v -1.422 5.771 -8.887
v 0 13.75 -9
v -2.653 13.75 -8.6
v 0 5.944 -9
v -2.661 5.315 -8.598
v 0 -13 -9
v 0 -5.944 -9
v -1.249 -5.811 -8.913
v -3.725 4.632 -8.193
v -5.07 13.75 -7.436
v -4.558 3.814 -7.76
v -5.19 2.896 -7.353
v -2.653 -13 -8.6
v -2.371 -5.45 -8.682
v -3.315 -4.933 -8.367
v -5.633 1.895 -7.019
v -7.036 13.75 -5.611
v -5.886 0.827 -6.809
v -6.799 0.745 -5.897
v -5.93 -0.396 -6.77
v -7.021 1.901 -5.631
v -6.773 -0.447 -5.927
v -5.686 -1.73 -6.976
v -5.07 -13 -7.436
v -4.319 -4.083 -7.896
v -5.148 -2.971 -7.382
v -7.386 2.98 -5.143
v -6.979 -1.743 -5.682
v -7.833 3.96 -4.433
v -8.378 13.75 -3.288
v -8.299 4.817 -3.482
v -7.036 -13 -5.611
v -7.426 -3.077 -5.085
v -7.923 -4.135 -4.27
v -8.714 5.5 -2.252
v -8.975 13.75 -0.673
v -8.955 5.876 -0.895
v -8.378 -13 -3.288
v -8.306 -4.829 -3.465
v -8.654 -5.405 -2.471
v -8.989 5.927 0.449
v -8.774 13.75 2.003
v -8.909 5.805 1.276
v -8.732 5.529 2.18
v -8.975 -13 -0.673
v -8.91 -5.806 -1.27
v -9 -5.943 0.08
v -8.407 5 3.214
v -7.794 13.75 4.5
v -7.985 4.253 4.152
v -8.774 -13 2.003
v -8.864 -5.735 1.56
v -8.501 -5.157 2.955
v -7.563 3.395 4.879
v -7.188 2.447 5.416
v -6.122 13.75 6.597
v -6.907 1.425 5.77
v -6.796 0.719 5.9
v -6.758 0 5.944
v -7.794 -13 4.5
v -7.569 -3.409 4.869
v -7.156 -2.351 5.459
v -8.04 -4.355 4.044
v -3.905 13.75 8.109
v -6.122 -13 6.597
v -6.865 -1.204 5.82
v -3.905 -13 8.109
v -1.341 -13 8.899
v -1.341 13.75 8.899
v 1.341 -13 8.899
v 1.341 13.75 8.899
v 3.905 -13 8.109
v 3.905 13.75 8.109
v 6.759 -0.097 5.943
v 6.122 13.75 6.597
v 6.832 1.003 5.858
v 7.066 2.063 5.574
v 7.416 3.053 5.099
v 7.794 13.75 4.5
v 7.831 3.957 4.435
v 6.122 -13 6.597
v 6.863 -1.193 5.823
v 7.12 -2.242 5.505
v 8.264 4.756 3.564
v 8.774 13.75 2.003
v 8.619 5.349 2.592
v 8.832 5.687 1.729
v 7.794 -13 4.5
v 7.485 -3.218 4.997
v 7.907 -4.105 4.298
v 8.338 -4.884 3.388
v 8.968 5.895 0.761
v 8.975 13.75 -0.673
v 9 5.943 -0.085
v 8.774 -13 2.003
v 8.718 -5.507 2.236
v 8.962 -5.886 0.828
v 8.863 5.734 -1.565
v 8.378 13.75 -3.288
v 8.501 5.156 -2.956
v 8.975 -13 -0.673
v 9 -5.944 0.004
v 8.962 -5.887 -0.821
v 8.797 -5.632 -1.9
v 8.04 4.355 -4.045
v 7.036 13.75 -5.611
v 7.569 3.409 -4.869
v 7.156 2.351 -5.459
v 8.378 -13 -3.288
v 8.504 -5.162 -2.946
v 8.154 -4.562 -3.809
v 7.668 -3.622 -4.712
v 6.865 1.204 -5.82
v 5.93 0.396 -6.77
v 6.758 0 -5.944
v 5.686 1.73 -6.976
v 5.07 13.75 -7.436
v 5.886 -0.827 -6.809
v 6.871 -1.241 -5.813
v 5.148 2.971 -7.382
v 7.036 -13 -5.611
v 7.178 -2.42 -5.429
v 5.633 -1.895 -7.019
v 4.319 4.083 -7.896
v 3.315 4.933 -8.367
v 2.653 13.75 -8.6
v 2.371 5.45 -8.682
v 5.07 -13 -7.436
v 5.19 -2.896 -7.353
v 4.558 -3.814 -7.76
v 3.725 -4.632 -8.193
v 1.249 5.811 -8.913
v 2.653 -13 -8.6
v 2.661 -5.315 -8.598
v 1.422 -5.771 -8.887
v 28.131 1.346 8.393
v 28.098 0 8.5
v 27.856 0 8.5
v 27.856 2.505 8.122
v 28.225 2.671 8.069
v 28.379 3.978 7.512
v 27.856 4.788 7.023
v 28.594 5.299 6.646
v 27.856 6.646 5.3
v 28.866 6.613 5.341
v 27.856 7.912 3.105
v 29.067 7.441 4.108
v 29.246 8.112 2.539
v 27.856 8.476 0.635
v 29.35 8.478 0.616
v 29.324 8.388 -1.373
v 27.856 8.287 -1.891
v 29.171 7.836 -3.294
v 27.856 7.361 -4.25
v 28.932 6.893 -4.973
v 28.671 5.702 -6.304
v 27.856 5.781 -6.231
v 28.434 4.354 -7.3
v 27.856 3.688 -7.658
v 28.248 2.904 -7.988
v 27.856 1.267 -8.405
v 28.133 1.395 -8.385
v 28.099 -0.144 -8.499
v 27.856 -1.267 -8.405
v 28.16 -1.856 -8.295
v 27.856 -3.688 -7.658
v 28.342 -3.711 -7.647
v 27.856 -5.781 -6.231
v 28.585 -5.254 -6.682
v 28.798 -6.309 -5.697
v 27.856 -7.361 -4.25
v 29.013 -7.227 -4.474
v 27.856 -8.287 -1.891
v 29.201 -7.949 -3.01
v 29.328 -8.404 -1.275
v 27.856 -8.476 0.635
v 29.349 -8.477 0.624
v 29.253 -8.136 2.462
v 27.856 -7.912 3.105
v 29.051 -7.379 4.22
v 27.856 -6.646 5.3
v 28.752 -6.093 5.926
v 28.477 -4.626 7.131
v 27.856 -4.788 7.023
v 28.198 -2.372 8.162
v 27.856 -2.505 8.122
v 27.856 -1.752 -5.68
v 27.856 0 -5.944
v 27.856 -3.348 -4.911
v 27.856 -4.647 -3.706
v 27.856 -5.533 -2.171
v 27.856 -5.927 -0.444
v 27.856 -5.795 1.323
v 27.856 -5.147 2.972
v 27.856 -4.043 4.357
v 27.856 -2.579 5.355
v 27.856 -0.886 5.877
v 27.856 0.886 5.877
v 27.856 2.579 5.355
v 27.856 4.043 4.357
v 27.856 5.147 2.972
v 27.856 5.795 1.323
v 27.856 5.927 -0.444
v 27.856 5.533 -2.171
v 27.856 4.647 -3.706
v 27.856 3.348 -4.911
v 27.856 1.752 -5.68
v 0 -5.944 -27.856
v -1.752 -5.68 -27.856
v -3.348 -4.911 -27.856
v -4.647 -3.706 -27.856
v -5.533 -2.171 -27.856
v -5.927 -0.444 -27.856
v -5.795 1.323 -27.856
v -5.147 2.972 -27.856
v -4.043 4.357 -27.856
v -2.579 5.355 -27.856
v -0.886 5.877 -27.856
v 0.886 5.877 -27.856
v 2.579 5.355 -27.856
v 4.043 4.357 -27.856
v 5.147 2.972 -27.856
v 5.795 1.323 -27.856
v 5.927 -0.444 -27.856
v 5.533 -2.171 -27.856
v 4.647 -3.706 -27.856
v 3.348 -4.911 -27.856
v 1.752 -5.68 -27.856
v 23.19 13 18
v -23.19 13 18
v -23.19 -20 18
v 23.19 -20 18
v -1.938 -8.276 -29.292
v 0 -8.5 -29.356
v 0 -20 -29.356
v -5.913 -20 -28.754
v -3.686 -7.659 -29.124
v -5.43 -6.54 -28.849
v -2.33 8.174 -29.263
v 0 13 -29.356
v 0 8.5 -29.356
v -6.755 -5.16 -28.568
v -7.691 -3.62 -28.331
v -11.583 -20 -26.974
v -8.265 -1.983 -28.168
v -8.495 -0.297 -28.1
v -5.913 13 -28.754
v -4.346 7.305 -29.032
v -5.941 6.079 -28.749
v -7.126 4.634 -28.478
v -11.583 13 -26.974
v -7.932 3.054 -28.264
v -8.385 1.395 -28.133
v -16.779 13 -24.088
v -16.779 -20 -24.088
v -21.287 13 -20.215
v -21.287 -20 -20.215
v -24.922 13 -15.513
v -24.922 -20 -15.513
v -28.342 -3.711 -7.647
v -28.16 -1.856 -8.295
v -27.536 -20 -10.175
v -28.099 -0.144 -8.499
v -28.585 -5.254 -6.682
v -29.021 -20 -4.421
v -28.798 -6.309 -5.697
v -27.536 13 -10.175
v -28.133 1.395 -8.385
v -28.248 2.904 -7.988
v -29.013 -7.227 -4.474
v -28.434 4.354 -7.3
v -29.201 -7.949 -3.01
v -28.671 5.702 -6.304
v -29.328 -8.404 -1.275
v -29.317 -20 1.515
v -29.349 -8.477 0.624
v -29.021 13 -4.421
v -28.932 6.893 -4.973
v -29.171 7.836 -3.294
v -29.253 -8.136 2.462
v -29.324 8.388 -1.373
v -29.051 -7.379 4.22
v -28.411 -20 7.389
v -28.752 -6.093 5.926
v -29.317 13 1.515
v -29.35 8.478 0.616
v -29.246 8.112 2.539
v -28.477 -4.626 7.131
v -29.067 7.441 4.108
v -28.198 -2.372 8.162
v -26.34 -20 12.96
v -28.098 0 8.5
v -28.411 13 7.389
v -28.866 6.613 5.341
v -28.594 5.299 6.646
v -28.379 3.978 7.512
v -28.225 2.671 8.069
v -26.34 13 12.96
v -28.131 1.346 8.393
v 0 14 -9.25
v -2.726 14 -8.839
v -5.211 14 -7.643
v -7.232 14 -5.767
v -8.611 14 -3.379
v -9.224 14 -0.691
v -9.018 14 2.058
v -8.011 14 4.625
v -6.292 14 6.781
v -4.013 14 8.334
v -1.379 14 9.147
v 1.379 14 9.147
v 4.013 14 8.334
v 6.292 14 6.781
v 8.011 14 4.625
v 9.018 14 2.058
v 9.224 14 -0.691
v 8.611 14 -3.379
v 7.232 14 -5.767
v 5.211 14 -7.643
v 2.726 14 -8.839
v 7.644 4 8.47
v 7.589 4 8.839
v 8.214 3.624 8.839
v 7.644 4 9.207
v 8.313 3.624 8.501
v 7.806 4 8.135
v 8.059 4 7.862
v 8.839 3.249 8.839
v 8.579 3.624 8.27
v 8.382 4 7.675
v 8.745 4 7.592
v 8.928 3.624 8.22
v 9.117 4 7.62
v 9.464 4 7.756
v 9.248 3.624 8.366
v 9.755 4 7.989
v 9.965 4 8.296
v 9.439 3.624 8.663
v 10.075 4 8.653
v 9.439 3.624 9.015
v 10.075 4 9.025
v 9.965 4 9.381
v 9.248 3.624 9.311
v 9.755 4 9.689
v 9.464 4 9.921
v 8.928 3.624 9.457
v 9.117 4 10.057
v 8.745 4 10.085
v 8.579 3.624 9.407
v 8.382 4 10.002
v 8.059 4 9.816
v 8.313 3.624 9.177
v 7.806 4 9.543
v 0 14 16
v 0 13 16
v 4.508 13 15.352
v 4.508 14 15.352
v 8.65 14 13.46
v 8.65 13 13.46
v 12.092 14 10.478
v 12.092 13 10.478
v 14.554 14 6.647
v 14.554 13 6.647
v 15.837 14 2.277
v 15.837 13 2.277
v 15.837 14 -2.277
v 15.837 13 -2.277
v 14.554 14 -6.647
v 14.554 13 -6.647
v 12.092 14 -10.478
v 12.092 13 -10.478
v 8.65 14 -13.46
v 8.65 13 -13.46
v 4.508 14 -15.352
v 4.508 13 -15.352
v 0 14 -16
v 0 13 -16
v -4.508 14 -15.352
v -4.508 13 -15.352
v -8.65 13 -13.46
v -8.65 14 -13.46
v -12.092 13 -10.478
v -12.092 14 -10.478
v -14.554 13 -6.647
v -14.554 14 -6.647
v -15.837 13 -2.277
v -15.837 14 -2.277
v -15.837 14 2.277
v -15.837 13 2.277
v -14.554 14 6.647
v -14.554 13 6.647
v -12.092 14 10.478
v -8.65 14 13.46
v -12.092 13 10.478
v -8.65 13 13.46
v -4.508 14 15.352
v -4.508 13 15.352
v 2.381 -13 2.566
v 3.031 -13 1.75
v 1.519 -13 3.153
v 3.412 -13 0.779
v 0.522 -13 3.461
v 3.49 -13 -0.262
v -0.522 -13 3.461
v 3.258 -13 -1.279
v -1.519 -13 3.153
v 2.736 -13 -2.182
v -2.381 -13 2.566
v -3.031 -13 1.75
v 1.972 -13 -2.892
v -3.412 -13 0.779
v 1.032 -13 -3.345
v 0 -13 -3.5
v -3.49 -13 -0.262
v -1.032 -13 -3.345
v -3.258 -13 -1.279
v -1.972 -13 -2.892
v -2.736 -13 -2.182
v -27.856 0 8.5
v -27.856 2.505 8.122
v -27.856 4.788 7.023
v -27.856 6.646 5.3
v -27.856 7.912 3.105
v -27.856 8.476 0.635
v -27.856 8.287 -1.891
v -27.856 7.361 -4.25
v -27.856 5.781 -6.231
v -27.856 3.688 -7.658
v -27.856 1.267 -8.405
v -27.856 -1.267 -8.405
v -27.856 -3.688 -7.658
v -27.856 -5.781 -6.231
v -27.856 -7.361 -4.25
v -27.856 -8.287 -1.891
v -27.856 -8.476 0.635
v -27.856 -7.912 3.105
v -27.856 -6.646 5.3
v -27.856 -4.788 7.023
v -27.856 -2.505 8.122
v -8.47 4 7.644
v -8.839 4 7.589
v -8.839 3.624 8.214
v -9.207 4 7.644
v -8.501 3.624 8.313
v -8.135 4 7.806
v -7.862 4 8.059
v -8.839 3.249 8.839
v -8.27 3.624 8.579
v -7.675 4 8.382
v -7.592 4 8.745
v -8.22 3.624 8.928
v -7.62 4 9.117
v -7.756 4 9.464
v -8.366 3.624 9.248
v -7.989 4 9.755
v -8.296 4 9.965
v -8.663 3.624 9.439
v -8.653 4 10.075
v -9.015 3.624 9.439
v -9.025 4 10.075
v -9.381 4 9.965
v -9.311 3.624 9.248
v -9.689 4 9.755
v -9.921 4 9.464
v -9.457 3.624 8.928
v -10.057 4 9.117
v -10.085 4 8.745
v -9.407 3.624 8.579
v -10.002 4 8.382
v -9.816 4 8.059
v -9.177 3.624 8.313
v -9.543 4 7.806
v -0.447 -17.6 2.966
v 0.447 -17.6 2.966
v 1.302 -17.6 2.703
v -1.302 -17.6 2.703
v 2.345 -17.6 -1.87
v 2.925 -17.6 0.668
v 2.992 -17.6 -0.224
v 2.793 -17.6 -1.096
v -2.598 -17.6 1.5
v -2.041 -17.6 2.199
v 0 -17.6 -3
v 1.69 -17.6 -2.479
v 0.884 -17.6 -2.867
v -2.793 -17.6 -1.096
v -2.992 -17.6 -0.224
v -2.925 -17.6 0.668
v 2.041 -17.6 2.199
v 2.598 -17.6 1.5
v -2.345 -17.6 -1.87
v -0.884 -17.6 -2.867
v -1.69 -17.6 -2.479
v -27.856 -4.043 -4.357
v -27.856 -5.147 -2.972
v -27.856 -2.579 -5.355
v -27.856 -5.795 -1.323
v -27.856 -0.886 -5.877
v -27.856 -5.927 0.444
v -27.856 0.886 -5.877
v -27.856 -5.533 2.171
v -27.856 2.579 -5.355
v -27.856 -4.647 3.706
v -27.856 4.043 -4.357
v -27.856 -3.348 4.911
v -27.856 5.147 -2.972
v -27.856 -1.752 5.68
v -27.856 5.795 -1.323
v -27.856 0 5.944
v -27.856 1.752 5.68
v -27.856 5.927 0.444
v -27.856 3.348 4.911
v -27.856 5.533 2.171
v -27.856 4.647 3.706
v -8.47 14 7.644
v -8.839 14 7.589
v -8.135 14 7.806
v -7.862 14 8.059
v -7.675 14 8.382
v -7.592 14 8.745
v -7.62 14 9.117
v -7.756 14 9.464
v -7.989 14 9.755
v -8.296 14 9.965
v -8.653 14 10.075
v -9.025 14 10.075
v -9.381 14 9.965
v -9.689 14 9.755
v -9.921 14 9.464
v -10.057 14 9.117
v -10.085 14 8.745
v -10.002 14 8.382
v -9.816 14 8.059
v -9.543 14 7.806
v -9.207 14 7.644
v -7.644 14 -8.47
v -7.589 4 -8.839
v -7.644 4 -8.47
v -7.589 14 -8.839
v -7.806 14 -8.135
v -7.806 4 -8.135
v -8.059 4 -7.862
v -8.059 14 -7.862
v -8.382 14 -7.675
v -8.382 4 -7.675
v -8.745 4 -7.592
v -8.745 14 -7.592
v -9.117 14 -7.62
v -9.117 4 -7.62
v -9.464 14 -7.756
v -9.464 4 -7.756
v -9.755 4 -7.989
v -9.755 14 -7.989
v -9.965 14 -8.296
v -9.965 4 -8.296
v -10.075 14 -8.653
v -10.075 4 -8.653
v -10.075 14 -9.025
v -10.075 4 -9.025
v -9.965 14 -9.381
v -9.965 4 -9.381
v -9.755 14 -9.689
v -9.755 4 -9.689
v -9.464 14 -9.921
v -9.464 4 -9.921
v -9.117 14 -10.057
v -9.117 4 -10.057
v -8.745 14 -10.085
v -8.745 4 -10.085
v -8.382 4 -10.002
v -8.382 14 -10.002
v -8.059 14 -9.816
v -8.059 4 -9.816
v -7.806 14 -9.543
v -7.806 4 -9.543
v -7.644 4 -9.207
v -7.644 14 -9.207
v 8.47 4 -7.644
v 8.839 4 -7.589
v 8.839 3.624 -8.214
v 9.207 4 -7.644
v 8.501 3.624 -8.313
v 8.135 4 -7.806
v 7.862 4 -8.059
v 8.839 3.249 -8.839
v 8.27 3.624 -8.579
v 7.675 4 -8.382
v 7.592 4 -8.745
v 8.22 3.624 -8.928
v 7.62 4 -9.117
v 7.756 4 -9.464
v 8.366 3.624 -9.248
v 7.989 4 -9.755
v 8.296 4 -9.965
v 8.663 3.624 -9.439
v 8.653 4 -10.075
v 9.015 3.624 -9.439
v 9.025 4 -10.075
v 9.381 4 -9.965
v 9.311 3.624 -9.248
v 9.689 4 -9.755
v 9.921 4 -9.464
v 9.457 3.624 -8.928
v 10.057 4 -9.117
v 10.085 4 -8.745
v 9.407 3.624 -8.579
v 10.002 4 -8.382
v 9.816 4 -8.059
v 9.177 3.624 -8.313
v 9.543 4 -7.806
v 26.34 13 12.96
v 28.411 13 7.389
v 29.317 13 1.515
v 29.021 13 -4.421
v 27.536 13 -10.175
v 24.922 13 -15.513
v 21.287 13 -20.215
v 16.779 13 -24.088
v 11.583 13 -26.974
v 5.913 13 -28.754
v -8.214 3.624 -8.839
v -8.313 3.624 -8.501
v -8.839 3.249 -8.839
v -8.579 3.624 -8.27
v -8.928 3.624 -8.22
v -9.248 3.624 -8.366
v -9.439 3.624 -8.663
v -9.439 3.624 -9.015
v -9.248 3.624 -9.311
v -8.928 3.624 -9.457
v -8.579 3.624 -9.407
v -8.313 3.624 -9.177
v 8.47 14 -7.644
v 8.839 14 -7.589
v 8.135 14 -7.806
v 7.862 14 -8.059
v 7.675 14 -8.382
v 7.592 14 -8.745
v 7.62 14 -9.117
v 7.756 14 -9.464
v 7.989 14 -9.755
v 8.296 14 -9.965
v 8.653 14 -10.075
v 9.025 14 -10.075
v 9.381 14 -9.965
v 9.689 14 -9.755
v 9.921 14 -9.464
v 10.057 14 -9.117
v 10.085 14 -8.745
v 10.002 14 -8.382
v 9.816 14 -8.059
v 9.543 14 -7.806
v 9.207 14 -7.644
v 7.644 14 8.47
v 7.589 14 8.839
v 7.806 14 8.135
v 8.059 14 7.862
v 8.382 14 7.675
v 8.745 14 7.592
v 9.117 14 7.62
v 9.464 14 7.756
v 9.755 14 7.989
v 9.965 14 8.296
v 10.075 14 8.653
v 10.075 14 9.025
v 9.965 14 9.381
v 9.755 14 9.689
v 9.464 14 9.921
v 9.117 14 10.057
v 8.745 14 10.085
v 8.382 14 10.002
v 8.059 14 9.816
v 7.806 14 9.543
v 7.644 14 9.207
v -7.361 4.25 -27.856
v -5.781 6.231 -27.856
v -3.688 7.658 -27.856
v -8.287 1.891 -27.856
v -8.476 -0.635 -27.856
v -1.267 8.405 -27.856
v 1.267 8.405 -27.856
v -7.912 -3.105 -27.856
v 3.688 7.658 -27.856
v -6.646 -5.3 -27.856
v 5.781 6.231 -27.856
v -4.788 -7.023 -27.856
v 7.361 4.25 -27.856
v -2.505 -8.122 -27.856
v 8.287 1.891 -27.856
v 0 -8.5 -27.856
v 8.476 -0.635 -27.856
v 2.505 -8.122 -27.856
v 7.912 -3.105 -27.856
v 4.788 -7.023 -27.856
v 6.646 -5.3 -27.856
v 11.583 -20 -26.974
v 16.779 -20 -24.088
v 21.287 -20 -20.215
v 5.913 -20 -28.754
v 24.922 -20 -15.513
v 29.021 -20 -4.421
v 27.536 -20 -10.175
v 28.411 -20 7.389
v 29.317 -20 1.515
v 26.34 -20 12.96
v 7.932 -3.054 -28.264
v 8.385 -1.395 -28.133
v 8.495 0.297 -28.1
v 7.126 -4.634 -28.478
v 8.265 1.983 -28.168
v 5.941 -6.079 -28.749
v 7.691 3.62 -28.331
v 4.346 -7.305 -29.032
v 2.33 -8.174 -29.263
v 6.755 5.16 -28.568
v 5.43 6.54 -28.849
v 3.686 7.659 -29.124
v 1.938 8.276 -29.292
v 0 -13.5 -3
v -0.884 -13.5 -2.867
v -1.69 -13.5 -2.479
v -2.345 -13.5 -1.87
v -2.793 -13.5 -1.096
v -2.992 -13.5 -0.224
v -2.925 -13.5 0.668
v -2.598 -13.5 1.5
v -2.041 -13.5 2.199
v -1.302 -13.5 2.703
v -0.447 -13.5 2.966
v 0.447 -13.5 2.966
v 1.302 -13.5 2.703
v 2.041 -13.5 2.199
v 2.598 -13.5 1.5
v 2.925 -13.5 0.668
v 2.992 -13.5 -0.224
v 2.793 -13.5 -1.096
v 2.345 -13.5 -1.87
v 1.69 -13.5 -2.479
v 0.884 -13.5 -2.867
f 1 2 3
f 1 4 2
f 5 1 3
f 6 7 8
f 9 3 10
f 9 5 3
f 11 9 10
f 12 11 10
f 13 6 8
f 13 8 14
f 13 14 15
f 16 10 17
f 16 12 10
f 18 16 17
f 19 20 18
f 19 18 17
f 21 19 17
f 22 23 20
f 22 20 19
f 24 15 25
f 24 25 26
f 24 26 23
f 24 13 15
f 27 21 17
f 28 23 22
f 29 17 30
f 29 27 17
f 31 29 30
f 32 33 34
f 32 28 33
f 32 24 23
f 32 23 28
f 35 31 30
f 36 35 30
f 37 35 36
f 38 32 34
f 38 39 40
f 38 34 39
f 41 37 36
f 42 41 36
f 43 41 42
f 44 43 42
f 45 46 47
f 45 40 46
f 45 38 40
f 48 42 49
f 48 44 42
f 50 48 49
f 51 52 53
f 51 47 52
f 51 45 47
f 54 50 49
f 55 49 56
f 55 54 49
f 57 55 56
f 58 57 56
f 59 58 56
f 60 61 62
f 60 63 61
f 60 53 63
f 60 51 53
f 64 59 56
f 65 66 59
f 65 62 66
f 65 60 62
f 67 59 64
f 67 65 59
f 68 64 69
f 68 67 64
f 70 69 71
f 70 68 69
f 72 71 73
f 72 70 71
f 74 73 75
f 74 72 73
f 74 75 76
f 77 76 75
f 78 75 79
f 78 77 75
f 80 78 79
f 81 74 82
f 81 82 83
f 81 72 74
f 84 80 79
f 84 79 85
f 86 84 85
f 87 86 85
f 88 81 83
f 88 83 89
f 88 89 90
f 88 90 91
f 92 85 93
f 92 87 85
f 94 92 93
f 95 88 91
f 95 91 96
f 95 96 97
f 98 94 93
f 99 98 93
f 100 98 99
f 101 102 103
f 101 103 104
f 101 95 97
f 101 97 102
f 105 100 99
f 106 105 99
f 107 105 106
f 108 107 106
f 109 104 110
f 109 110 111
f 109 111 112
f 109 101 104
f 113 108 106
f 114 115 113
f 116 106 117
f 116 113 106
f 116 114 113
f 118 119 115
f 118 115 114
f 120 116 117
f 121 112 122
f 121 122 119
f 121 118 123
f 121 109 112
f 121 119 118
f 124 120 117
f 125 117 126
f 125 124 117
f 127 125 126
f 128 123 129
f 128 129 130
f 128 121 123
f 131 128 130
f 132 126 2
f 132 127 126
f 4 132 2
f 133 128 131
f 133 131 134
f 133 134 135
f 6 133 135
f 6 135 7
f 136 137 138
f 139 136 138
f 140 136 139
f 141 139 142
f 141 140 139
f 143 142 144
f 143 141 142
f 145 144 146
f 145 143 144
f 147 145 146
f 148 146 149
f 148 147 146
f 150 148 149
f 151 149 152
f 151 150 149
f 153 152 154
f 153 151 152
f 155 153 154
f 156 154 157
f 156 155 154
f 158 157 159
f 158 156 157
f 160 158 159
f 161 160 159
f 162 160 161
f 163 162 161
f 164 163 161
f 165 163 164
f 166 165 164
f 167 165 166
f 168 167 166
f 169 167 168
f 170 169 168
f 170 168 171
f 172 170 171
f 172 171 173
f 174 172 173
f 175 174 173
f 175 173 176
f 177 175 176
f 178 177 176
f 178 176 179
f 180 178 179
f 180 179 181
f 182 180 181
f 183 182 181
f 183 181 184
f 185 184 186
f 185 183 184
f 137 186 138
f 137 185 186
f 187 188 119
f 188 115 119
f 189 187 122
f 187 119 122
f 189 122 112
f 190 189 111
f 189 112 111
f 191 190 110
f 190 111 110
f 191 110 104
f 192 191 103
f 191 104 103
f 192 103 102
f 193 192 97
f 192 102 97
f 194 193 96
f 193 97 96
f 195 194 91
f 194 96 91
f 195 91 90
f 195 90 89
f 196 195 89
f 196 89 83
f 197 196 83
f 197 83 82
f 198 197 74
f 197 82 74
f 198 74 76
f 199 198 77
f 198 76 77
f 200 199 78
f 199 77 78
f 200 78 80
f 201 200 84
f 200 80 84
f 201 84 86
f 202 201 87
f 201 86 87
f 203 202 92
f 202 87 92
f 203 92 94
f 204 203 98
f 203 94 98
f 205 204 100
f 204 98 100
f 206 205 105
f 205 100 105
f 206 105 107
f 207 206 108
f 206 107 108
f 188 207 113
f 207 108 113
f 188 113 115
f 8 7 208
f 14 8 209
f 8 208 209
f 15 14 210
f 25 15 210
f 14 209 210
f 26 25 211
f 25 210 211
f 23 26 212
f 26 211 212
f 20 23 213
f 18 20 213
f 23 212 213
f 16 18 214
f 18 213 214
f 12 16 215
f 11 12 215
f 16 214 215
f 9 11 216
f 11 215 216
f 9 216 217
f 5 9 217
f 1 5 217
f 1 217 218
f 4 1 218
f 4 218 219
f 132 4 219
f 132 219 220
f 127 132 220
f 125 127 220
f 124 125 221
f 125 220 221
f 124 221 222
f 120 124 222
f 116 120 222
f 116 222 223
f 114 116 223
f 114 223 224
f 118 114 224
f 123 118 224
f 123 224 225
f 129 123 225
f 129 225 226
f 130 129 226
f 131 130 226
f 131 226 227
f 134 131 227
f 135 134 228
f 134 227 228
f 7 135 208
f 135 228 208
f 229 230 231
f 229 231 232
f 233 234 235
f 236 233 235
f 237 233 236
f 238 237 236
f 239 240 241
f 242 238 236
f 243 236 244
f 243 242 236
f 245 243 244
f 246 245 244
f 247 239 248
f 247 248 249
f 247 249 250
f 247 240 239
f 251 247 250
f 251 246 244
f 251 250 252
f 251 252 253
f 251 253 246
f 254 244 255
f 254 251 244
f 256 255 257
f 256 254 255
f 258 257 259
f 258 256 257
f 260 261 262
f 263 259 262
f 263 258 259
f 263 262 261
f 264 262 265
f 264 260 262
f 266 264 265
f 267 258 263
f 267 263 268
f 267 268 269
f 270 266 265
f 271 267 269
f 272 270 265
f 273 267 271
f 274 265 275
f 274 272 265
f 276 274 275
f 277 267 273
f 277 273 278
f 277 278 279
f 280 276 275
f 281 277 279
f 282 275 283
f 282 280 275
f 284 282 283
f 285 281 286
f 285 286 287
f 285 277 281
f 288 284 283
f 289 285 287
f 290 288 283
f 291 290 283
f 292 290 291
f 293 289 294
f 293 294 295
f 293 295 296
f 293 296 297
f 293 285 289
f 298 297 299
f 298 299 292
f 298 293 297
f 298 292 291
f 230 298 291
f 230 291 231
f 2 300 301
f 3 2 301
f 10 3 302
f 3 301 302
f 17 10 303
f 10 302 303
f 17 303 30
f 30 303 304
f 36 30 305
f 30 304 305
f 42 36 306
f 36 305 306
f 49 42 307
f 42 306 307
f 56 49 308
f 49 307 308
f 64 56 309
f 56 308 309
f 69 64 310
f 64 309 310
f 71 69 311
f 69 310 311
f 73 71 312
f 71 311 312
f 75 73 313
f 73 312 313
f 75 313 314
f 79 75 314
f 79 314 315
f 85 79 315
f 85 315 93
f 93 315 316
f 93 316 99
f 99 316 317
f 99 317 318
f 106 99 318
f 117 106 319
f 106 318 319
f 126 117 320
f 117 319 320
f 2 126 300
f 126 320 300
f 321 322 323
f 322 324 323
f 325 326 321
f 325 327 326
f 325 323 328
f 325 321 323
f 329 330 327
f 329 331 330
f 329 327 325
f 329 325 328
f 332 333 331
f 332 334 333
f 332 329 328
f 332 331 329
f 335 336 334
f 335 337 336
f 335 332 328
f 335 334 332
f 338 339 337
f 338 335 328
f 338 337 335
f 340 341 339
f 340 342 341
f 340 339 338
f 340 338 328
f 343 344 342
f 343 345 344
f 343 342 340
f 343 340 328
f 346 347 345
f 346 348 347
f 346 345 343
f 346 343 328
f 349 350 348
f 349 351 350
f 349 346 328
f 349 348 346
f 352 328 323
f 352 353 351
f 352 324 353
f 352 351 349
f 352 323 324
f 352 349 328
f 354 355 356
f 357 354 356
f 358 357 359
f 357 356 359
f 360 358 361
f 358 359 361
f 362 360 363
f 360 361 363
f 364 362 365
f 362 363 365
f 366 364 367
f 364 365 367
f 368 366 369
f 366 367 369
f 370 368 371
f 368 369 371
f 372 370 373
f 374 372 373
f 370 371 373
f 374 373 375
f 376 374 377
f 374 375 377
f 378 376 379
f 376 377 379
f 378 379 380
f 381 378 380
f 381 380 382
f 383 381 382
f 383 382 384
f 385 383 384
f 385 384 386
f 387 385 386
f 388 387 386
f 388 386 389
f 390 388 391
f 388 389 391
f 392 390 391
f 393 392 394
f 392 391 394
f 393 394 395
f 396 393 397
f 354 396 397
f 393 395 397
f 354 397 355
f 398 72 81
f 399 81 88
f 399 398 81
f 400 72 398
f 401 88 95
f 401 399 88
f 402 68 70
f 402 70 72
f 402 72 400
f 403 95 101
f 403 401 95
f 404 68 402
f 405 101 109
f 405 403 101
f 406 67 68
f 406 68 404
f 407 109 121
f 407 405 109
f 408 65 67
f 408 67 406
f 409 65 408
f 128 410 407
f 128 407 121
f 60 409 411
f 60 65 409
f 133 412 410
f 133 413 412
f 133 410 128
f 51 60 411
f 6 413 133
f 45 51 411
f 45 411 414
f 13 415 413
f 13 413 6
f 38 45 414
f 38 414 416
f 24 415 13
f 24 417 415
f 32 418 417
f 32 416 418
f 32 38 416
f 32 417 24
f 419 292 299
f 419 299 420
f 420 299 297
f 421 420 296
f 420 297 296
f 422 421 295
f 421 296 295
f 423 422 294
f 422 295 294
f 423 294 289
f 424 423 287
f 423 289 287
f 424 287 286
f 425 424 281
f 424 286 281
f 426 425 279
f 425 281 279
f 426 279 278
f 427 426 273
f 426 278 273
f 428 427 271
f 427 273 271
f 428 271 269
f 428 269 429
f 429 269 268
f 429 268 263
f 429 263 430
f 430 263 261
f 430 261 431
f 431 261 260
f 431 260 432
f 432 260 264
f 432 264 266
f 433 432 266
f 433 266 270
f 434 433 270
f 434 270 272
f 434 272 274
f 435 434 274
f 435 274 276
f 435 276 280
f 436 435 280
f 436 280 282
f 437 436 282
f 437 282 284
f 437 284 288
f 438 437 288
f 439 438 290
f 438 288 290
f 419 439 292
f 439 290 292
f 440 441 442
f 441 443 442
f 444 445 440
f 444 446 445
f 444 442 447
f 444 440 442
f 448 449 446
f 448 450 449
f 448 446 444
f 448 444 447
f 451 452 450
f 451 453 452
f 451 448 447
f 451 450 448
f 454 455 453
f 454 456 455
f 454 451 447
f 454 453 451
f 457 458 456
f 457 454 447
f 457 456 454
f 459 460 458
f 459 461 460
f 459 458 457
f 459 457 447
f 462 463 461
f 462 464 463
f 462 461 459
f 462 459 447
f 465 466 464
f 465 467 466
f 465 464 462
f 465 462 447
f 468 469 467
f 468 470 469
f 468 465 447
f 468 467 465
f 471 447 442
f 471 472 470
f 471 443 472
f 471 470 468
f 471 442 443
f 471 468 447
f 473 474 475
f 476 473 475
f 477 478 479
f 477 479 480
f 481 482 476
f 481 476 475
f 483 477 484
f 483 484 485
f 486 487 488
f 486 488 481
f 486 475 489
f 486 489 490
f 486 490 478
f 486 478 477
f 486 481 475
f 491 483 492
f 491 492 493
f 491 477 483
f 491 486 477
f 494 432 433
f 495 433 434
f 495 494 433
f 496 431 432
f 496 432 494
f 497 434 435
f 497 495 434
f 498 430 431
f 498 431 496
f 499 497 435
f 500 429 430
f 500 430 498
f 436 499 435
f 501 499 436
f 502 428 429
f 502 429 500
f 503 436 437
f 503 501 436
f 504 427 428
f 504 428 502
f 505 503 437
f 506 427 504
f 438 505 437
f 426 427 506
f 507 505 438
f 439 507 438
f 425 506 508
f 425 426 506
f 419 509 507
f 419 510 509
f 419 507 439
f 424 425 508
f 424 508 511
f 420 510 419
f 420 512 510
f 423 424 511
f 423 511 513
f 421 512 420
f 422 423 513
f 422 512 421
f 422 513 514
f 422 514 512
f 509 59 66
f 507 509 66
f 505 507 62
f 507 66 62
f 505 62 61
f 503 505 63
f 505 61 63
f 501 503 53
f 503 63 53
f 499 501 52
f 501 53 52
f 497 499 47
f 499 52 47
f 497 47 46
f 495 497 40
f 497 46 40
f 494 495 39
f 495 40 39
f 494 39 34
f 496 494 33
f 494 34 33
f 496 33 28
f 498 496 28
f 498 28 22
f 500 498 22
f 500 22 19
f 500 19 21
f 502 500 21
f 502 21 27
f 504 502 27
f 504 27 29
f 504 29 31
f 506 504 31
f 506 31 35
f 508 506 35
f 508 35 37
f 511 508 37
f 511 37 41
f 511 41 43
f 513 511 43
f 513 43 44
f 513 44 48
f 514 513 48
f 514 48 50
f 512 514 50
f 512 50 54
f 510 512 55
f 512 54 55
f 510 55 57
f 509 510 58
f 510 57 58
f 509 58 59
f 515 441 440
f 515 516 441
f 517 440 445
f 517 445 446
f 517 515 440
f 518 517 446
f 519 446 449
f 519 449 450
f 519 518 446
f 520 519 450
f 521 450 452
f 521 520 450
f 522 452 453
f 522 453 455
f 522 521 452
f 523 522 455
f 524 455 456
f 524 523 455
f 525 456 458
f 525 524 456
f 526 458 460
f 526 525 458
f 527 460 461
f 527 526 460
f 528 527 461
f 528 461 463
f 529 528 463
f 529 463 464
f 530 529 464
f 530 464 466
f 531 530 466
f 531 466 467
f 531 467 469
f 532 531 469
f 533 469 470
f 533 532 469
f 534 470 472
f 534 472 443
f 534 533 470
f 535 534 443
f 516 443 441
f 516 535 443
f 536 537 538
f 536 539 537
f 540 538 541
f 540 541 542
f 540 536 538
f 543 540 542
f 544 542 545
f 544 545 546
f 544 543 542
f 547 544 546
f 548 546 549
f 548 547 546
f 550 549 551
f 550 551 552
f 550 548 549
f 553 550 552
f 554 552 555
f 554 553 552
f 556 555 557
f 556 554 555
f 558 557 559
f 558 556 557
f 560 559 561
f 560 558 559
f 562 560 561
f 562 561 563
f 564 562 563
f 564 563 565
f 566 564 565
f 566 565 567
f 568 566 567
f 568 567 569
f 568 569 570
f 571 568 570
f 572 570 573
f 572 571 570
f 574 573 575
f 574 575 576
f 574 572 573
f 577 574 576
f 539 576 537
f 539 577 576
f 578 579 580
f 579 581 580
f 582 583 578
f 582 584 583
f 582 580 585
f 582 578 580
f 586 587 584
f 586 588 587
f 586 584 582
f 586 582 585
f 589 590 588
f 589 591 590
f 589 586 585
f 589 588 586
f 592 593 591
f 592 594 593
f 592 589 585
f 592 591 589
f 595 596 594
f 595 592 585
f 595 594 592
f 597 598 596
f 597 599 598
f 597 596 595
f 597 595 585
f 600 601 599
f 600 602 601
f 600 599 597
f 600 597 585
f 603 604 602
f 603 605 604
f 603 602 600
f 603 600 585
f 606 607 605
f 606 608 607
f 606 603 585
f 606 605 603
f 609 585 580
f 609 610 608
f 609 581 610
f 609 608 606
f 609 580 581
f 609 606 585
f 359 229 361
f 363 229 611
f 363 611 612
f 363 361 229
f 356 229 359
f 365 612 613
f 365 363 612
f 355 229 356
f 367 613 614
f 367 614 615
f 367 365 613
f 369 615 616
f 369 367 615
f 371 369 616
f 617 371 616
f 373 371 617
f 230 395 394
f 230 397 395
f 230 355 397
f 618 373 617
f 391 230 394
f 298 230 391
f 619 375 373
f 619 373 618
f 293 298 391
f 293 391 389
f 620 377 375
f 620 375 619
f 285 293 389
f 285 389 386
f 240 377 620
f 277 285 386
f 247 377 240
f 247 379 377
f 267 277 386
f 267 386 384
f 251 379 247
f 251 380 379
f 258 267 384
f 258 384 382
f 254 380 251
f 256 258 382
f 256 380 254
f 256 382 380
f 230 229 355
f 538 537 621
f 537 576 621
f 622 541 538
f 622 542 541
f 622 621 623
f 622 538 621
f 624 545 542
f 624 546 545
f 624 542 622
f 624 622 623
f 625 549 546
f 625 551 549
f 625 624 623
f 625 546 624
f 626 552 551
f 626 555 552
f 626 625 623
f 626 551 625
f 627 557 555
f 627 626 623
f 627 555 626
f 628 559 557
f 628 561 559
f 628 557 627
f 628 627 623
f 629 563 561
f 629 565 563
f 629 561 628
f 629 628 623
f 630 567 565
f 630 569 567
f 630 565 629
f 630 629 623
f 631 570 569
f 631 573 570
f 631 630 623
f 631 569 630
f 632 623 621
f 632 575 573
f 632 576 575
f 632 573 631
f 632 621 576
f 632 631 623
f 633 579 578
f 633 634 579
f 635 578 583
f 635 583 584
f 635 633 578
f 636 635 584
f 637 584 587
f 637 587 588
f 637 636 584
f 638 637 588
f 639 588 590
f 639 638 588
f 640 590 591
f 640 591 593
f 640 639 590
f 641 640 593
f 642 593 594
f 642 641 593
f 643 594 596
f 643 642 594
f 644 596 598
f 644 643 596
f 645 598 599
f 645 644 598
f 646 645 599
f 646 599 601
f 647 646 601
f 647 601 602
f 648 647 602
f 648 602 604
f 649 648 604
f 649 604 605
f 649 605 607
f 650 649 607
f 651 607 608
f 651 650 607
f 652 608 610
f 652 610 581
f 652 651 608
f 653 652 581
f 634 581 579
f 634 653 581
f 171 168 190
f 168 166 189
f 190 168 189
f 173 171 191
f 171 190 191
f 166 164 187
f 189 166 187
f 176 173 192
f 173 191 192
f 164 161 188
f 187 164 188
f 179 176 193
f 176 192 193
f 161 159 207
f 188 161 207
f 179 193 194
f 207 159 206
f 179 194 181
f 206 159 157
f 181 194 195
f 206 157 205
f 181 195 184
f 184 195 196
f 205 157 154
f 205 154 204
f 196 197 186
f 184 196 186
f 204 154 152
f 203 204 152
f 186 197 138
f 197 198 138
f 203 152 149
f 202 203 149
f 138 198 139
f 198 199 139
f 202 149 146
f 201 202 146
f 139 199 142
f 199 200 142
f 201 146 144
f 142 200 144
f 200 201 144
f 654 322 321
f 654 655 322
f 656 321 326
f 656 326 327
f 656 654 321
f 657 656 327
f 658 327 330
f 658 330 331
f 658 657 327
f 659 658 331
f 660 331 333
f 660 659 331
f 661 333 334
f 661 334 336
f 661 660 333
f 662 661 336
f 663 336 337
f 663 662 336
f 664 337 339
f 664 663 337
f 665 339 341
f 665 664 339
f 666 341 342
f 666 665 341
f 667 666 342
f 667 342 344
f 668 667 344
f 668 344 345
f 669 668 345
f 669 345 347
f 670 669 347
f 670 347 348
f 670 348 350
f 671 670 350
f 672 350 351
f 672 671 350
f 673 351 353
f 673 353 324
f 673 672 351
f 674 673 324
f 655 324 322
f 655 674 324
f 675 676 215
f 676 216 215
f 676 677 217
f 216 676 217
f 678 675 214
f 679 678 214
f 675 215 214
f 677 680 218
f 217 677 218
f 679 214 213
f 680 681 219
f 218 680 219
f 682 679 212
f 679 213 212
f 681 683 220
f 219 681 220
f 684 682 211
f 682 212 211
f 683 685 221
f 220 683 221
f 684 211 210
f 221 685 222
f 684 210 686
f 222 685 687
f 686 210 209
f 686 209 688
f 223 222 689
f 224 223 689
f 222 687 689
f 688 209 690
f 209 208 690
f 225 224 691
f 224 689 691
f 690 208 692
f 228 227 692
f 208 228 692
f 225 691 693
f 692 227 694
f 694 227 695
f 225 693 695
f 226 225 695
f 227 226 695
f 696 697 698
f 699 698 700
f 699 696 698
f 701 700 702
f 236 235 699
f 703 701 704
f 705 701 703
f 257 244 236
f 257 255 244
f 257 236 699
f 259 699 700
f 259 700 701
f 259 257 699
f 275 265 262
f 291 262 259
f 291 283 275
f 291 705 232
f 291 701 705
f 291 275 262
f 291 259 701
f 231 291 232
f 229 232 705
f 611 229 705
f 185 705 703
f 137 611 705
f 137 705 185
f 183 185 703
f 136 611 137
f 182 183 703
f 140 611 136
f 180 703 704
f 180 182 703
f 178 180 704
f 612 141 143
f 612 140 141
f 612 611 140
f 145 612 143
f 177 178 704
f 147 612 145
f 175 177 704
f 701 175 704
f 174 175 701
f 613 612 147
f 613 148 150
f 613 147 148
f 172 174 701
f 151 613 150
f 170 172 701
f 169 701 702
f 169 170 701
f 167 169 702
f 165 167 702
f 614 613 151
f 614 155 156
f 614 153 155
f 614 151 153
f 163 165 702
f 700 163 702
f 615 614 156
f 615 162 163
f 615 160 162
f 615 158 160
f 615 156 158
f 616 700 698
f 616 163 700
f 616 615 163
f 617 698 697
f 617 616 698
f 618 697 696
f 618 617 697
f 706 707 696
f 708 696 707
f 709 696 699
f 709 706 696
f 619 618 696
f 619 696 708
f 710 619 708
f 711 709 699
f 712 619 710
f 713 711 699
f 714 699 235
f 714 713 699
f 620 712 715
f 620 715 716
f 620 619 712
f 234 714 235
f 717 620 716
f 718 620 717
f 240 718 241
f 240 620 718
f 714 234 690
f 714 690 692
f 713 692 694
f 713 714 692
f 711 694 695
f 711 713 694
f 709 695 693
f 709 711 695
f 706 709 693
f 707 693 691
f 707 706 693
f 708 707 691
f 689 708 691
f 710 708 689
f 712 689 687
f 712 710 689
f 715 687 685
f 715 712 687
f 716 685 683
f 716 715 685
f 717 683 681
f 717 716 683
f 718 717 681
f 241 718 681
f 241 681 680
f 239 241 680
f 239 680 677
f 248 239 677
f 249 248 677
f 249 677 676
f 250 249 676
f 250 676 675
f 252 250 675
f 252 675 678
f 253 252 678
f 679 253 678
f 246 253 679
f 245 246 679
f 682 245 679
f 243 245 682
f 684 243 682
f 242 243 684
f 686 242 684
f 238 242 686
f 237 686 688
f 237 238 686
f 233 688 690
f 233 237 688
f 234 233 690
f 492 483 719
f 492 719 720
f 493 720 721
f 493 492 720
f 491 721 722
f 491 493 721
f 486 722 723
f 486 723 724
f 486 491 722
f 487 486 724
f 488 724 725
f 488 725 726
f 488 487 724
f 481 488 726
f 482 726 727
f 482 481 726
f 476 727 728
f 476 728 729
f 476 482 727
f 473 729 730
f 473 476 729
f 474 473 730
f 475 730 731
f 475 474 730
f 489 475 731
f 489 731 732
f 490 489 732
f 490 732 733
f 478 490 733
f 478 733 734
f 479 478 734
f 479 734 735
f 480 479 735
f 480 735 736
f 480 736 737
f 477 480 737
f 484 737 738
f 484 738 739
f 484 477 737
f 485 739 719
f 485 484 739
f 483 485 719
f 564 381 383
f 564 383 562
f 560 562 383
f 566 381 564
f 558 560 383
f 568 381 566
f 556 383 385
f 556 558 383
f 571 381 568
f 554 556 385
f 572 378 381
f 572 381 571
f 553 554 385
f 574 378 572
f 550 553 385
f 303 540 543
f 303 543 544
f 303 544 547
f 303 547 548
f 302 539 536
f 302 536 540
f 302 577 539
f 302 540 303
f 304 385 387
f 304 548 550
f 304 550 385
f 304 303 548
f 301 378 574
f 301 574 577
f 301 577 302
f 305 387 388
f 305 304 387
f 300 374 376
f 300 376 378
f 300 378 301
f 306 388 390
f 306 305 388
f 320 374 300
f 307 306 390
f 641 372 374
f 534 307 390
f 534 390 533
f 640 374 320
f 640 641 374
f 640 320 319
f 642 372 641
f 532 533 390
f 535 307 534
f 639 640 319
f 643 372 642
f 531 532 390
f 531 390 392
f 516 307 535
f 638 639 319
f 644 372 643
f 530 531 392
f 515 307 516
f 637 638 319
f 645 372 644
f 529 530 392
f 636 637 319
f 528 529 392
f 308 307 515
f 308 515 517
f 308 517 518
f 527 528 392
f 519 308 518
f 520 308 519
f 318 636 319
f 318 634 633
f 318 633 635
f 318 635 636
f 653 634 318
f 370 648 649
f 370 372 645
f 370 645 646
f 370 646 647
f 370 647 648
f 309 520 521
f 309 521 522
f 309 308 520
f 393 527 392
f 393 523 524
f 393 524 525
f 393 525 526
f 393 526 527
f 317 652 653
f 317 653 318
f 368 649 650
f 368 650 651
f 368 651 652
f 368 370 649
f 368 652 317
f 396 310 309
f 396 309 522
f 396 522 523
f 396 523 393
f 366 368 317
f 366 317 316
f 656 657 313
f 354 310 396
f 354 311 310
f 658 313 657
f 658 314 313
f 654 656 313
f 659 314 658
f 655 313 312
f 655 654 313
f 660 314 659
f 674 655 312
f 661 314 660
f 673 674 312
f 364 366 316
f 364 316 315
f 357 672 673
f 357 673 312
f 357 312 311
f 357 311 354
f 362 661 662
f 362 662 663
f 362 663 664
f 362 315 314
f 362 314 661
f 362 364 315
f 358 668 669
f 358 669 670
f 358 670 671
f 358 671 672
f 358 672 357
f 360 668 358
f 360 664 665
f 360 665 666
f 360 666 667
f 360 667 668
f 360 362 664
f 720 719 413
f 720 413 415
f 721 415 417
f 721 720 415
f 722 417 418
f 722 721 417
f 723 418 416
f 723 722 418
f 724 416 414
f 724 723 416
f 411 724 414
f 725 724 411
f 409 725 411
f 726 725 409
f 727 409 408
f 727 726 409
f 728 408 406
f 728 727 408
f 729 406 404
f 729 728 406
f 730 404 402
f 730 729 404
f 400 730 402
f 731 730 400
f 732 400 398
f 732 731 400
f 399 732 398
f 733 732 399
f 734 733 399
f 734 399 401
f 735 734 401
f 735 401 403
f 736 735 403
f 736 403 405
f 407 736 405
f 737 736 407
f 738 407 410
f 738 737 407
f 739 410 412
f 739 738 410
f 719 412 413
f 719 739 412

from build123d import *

# Parameters (mm, degrees)
ESBO_O4_W                           = 5.9436
ESBO_O4_H                           = 29.356
FURO_ROSCADO_DE_1_4_18_NPSM3_REACH  = 70.621
FURO_ROSCADO_DE_1_4_18_NPSM3_BORE_R = 5.9436
ESBO_O12_R                          = 16
ESBO_O12_R_2                        = 9
RESSALTO_EXTRUS_O1_DEPTH            = 1
PADR_OCIRCULAR5_COUNT               = 4
CHANFRO1_SIZE                       = 0.5
CHANFRO2_SIZE                       = 0.25
FURO_ROSCADO_DE_1_4_18_NPSM2_D      = 11.8872
ESBO_O18_R                          = 8.5
CORTE_EXTRUS_O4_DEPTH               = 1.5
ESBO_O20_R                          = 8.5
CORTE_EXTRUS_O5_DEPTH               = 1.5
CORTE_EXTRUS_O6_DEPTH               = 54.033475186


with BuildPart() as part:
    # Esboço1 → Revolução1 (revolve)
    with BuildSketch(Plane.XY, mode=Mode.PRIVATE) as revolu_o1_sk:
        Polygon((0, -20), (29.356, -20), (29.356, 13), (9, 13), (9, -13), (3, -13), (3, -17.6), (0, -17.6), align=None)
    revolve(revolu_o1_sk.sketch.rotate(Axis((0, -20, 0), (0, 1, 0)), 90), axis=Axis((0, -20, 0), (0, 1, 0)))

    # Esboço4 → Furo roscado de 1/4-18 NPSM1 (revolve, cut)
    with BuildSketch(Plane(origin=(29.356, 0, 0), x_dir=(0, 0, -1), z_dir=(0, 1, 0))):
        with Locations((2.9718, 14.678)):
            Rectangle(ESBO_O4_W, ESBO_O4_H)
    revolve(axis=Axis((35.706, 0, 0), (-1, 0, 0)), mode=Mode.SUBTRACT)

    # Furo roscado de 1/4-18 NPSM3 bore → Furo roscado de 1/4-18 NPSM3 (cut, up to next)
    with BuildSketch(Plane(origin=(0, 0, -29.356), x_dir=(0, -1, 0), z_dir=(0, 0, -1)), mode=Mode.PRIVATE) as furo_roscado_de_1_4_18_npsm3_sk1:
        Circle(FURO_ROSCADO_DE_1_4_18_NPSM3_BORE_R)
    furo_roscado_de_1_4_18_npsm3_tool1 = extrude(furo_roscado_de_1_4_18_npsm3_sk1.sketch, amount=-FURO_ROSCADO_DE_1_4_18_NPSM3_REACH, mode=Mode.PRIVATE) & part.part
    add(furo_roscado_de_1_4_18_npsm3_tool1.solids().sort_by_distance((0, 0, -29.356))[0], mode=Mode.SUBTRACT)

    # Esboço12 → Ressalto-extrusão1 (add)
    with BuildSketch(Plane(origin=(0, 13, 0), x_dir=(1, 0, 0), z_dir=(0, 1, 0))):
        with Locations(Location((0, 0, 0), (0, 0, 270))):
            Circle(ESBO_O12_R)
        with Locations(Location((0, 0, 0), (0, 0, 90))):
            Circle(ESBO_O12_R_2, mode=Mode.SUBTRACT)
    extrude(amount=RESSALTO_EXTRUS_O1_DEPTH)

    # Esboço13 → Furo roscado de M3x0.51 (revolve, cut)
    with BuildSketch(Plane(origin=(8.838834765, 14, -8.838834765), x_dir=(0, 0, 1), z_dir=(1, 0, 0))):
        Polygon((0, 0), (0, 10.751075774), (1.25, 10), (1.25, 0), align=None)
    furo_roscado_de_m3x0_51 = revolve(axis=Axis((8.838834765, 20.35, -8.838834765), (0, -1, 0)), mode=Mode.SUBTRACT)

    # PadrãoCircular5: Furo roscado de M3x0.51 ×4 about axis
    padr_ocircular5_axis = Axis((0, 0, 0), (0, 1, 0))
    for i in range(1, PADR_OCIRCULAR5_COUNT):
        add(furo_roscado_de_m3x0_51.rotate(padr_ocircular5_axis, i * 360 / PADR_OCIRCULAR5_COUNT), mode=Mode.SUBTRACT)

    # Chanfro1
    chanfro1_edges = [part.edges().sort_by_distance(p)[0] for p in [
        (0, -13, 3),
    ]]
    chamfer(chanfro1_edges, length=CHANFRO1_SIZE)

    # Chanfro2
    chanfro2_edges = [part.edges().sort_by_distance(p)[0] for p in [
        (0, 14, 9),
    ]]
    chamfer(chanfro2_edges, length=CHANFRO2_SIZE)

    # Furo roscado de 1/4-18 NPSM2 (through all)
    with Locations(Plane(origin=(-29.356, 0, 0), x_dir=(0, 0, -1), z_dir=(-1, 0, 0))):
        with Locations((0, 0)):
            Hole(FURO_ROSCADO_DE_1_4_18_NPSM2_D / 2)

    # Esboço18 → Corte-extrusão4 (cut)
    with BuildSketch(Plane(origin=(-29.356, 0, 0), x_dir=(0, -1, 0), z_dir=(-1, 0, 0))):
        with Locations(Location((0, 0, 0), (0, 0, 90))):
            Circle(ESBO_O18_R)
    corte_extrus_o4 = extrude(amount=-CORTE_EXTRUS_O4_DEPTH, mode=Mode.SUBTRACT)

    # Esboço20 → Corte-extrusão5 (cut)
    with BuildSketch(Plane(origin=(0, 0, -29.356), x_dir=(0, -1, 0), z_dir=(0, 0, 1))):
        Circle(ESBO_O20_R)
    extrude(amount=CORTE_EXTRUS_O5_DEPTH, mode=Mode.SUBTRACT)

    # Espelhar1: Corte-extrusão4 across plane
    add(corte_extrus_o4.mirror(Plane(origin=(0, 0, 0), x_dir=(0, 0, 1), z_dir=(1, 0, 0))), mode=Mode.SUBTRACT)

    # Esboço21 → Corte-extrusão6 (cut, through all)
    with BuildSketch(Plane(origin=(0, 13, 0), x_dir=(1, 0, 0), z_dir=(0, 1, 0))):
        with BuildLine():
            Line((-23.189970591, -18), (23.189970591, -18))
            ThreePointArc((23.189970591, -18), (0, -29.356), (-23.189970591, -18))
        make_face()
    extrude(amount=-CORTE_EXTRUS_O6_DEPTH, mode=Mode.SUBTRACT)


solid = part.part
